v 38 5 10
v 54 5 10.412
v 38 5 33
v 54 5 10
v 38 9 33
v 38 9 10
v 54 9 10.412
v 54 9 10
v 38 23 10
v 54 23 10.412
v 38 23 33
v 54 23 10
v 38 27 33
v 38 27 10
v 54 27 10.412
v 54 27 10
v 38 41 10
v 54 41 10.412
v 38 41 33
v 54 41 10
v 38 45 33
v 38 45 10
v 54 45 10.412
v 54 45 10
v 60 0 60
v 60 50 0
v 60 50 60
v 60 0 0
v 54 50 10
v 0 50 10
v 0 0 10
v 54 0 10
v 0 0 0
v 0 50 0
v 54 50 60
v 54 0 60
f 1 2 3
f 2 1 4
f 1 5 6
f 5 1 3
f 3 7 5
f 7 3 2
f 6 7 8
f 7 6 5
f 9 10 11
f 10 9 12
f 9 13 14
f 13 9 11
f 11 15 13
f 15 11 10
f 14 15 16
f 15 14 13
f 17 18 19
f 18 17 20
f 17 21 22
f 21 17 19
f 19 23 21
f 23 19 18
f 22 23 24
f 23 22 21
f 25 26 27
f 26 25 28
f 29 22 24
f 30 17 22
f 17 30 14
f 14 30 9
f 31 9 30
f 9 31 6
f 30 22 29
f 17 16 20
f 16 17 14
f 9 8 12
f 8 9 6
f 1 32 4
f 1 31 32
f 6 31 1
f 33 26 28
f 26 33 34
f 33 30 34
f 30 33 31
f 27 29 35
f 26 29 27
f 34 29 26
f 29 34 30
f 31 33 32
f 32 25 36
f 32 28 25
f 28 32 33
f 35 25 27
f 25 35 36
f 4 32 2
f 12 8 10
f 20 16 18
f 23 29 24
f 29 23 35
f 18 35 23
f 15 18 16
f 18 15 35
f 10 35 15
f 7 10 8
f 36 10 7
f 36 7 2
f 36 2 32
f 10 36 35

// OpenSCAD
$fn = 32;

// ----------------------------------------------------------------------
// Rib bracket: 3-gusset L bracket
// ----------------------------------------------------------------------

// --- parameters (mm) ---
base_l = 60;              // foot length, X
base_w = 50;              // foot width, Y
base_t = 10;              // foot thickness
plate_t = 6;              // upright plate thickness
plate_h = 60;             // overall height
gus_l = 16;               // gusset leg along the foot
gus_h = 24;               // gusset height
gus_t = 4;                // gusset thickness
gus_edge = 5;             // gusset margin from the foot edge
n_gus = 3;                // gusset count

gus_pitch = (base_w - 2 * gus_edge - gus_t) / (n_gus - 1);  // gusset pitch

union() {
  cube([base_l, base_w, base_t]);
  translate([base_l - plate_t, 0, base_t - 1])
    cube([plate_t, base_w, plate_h - base_t + 1]);
  for (i = [0 : n_gus - 1])
    translate([base_l - plate_t - gus_l, gus_edge + i * gus_pitch, base_t - 1])
      rotate([-90, 0, 0])
        linear_extrude(height = gus_t)
          polygon(points = [[0, 0], [gus_l + 1, 0], [0, -gus_h]]);
}
